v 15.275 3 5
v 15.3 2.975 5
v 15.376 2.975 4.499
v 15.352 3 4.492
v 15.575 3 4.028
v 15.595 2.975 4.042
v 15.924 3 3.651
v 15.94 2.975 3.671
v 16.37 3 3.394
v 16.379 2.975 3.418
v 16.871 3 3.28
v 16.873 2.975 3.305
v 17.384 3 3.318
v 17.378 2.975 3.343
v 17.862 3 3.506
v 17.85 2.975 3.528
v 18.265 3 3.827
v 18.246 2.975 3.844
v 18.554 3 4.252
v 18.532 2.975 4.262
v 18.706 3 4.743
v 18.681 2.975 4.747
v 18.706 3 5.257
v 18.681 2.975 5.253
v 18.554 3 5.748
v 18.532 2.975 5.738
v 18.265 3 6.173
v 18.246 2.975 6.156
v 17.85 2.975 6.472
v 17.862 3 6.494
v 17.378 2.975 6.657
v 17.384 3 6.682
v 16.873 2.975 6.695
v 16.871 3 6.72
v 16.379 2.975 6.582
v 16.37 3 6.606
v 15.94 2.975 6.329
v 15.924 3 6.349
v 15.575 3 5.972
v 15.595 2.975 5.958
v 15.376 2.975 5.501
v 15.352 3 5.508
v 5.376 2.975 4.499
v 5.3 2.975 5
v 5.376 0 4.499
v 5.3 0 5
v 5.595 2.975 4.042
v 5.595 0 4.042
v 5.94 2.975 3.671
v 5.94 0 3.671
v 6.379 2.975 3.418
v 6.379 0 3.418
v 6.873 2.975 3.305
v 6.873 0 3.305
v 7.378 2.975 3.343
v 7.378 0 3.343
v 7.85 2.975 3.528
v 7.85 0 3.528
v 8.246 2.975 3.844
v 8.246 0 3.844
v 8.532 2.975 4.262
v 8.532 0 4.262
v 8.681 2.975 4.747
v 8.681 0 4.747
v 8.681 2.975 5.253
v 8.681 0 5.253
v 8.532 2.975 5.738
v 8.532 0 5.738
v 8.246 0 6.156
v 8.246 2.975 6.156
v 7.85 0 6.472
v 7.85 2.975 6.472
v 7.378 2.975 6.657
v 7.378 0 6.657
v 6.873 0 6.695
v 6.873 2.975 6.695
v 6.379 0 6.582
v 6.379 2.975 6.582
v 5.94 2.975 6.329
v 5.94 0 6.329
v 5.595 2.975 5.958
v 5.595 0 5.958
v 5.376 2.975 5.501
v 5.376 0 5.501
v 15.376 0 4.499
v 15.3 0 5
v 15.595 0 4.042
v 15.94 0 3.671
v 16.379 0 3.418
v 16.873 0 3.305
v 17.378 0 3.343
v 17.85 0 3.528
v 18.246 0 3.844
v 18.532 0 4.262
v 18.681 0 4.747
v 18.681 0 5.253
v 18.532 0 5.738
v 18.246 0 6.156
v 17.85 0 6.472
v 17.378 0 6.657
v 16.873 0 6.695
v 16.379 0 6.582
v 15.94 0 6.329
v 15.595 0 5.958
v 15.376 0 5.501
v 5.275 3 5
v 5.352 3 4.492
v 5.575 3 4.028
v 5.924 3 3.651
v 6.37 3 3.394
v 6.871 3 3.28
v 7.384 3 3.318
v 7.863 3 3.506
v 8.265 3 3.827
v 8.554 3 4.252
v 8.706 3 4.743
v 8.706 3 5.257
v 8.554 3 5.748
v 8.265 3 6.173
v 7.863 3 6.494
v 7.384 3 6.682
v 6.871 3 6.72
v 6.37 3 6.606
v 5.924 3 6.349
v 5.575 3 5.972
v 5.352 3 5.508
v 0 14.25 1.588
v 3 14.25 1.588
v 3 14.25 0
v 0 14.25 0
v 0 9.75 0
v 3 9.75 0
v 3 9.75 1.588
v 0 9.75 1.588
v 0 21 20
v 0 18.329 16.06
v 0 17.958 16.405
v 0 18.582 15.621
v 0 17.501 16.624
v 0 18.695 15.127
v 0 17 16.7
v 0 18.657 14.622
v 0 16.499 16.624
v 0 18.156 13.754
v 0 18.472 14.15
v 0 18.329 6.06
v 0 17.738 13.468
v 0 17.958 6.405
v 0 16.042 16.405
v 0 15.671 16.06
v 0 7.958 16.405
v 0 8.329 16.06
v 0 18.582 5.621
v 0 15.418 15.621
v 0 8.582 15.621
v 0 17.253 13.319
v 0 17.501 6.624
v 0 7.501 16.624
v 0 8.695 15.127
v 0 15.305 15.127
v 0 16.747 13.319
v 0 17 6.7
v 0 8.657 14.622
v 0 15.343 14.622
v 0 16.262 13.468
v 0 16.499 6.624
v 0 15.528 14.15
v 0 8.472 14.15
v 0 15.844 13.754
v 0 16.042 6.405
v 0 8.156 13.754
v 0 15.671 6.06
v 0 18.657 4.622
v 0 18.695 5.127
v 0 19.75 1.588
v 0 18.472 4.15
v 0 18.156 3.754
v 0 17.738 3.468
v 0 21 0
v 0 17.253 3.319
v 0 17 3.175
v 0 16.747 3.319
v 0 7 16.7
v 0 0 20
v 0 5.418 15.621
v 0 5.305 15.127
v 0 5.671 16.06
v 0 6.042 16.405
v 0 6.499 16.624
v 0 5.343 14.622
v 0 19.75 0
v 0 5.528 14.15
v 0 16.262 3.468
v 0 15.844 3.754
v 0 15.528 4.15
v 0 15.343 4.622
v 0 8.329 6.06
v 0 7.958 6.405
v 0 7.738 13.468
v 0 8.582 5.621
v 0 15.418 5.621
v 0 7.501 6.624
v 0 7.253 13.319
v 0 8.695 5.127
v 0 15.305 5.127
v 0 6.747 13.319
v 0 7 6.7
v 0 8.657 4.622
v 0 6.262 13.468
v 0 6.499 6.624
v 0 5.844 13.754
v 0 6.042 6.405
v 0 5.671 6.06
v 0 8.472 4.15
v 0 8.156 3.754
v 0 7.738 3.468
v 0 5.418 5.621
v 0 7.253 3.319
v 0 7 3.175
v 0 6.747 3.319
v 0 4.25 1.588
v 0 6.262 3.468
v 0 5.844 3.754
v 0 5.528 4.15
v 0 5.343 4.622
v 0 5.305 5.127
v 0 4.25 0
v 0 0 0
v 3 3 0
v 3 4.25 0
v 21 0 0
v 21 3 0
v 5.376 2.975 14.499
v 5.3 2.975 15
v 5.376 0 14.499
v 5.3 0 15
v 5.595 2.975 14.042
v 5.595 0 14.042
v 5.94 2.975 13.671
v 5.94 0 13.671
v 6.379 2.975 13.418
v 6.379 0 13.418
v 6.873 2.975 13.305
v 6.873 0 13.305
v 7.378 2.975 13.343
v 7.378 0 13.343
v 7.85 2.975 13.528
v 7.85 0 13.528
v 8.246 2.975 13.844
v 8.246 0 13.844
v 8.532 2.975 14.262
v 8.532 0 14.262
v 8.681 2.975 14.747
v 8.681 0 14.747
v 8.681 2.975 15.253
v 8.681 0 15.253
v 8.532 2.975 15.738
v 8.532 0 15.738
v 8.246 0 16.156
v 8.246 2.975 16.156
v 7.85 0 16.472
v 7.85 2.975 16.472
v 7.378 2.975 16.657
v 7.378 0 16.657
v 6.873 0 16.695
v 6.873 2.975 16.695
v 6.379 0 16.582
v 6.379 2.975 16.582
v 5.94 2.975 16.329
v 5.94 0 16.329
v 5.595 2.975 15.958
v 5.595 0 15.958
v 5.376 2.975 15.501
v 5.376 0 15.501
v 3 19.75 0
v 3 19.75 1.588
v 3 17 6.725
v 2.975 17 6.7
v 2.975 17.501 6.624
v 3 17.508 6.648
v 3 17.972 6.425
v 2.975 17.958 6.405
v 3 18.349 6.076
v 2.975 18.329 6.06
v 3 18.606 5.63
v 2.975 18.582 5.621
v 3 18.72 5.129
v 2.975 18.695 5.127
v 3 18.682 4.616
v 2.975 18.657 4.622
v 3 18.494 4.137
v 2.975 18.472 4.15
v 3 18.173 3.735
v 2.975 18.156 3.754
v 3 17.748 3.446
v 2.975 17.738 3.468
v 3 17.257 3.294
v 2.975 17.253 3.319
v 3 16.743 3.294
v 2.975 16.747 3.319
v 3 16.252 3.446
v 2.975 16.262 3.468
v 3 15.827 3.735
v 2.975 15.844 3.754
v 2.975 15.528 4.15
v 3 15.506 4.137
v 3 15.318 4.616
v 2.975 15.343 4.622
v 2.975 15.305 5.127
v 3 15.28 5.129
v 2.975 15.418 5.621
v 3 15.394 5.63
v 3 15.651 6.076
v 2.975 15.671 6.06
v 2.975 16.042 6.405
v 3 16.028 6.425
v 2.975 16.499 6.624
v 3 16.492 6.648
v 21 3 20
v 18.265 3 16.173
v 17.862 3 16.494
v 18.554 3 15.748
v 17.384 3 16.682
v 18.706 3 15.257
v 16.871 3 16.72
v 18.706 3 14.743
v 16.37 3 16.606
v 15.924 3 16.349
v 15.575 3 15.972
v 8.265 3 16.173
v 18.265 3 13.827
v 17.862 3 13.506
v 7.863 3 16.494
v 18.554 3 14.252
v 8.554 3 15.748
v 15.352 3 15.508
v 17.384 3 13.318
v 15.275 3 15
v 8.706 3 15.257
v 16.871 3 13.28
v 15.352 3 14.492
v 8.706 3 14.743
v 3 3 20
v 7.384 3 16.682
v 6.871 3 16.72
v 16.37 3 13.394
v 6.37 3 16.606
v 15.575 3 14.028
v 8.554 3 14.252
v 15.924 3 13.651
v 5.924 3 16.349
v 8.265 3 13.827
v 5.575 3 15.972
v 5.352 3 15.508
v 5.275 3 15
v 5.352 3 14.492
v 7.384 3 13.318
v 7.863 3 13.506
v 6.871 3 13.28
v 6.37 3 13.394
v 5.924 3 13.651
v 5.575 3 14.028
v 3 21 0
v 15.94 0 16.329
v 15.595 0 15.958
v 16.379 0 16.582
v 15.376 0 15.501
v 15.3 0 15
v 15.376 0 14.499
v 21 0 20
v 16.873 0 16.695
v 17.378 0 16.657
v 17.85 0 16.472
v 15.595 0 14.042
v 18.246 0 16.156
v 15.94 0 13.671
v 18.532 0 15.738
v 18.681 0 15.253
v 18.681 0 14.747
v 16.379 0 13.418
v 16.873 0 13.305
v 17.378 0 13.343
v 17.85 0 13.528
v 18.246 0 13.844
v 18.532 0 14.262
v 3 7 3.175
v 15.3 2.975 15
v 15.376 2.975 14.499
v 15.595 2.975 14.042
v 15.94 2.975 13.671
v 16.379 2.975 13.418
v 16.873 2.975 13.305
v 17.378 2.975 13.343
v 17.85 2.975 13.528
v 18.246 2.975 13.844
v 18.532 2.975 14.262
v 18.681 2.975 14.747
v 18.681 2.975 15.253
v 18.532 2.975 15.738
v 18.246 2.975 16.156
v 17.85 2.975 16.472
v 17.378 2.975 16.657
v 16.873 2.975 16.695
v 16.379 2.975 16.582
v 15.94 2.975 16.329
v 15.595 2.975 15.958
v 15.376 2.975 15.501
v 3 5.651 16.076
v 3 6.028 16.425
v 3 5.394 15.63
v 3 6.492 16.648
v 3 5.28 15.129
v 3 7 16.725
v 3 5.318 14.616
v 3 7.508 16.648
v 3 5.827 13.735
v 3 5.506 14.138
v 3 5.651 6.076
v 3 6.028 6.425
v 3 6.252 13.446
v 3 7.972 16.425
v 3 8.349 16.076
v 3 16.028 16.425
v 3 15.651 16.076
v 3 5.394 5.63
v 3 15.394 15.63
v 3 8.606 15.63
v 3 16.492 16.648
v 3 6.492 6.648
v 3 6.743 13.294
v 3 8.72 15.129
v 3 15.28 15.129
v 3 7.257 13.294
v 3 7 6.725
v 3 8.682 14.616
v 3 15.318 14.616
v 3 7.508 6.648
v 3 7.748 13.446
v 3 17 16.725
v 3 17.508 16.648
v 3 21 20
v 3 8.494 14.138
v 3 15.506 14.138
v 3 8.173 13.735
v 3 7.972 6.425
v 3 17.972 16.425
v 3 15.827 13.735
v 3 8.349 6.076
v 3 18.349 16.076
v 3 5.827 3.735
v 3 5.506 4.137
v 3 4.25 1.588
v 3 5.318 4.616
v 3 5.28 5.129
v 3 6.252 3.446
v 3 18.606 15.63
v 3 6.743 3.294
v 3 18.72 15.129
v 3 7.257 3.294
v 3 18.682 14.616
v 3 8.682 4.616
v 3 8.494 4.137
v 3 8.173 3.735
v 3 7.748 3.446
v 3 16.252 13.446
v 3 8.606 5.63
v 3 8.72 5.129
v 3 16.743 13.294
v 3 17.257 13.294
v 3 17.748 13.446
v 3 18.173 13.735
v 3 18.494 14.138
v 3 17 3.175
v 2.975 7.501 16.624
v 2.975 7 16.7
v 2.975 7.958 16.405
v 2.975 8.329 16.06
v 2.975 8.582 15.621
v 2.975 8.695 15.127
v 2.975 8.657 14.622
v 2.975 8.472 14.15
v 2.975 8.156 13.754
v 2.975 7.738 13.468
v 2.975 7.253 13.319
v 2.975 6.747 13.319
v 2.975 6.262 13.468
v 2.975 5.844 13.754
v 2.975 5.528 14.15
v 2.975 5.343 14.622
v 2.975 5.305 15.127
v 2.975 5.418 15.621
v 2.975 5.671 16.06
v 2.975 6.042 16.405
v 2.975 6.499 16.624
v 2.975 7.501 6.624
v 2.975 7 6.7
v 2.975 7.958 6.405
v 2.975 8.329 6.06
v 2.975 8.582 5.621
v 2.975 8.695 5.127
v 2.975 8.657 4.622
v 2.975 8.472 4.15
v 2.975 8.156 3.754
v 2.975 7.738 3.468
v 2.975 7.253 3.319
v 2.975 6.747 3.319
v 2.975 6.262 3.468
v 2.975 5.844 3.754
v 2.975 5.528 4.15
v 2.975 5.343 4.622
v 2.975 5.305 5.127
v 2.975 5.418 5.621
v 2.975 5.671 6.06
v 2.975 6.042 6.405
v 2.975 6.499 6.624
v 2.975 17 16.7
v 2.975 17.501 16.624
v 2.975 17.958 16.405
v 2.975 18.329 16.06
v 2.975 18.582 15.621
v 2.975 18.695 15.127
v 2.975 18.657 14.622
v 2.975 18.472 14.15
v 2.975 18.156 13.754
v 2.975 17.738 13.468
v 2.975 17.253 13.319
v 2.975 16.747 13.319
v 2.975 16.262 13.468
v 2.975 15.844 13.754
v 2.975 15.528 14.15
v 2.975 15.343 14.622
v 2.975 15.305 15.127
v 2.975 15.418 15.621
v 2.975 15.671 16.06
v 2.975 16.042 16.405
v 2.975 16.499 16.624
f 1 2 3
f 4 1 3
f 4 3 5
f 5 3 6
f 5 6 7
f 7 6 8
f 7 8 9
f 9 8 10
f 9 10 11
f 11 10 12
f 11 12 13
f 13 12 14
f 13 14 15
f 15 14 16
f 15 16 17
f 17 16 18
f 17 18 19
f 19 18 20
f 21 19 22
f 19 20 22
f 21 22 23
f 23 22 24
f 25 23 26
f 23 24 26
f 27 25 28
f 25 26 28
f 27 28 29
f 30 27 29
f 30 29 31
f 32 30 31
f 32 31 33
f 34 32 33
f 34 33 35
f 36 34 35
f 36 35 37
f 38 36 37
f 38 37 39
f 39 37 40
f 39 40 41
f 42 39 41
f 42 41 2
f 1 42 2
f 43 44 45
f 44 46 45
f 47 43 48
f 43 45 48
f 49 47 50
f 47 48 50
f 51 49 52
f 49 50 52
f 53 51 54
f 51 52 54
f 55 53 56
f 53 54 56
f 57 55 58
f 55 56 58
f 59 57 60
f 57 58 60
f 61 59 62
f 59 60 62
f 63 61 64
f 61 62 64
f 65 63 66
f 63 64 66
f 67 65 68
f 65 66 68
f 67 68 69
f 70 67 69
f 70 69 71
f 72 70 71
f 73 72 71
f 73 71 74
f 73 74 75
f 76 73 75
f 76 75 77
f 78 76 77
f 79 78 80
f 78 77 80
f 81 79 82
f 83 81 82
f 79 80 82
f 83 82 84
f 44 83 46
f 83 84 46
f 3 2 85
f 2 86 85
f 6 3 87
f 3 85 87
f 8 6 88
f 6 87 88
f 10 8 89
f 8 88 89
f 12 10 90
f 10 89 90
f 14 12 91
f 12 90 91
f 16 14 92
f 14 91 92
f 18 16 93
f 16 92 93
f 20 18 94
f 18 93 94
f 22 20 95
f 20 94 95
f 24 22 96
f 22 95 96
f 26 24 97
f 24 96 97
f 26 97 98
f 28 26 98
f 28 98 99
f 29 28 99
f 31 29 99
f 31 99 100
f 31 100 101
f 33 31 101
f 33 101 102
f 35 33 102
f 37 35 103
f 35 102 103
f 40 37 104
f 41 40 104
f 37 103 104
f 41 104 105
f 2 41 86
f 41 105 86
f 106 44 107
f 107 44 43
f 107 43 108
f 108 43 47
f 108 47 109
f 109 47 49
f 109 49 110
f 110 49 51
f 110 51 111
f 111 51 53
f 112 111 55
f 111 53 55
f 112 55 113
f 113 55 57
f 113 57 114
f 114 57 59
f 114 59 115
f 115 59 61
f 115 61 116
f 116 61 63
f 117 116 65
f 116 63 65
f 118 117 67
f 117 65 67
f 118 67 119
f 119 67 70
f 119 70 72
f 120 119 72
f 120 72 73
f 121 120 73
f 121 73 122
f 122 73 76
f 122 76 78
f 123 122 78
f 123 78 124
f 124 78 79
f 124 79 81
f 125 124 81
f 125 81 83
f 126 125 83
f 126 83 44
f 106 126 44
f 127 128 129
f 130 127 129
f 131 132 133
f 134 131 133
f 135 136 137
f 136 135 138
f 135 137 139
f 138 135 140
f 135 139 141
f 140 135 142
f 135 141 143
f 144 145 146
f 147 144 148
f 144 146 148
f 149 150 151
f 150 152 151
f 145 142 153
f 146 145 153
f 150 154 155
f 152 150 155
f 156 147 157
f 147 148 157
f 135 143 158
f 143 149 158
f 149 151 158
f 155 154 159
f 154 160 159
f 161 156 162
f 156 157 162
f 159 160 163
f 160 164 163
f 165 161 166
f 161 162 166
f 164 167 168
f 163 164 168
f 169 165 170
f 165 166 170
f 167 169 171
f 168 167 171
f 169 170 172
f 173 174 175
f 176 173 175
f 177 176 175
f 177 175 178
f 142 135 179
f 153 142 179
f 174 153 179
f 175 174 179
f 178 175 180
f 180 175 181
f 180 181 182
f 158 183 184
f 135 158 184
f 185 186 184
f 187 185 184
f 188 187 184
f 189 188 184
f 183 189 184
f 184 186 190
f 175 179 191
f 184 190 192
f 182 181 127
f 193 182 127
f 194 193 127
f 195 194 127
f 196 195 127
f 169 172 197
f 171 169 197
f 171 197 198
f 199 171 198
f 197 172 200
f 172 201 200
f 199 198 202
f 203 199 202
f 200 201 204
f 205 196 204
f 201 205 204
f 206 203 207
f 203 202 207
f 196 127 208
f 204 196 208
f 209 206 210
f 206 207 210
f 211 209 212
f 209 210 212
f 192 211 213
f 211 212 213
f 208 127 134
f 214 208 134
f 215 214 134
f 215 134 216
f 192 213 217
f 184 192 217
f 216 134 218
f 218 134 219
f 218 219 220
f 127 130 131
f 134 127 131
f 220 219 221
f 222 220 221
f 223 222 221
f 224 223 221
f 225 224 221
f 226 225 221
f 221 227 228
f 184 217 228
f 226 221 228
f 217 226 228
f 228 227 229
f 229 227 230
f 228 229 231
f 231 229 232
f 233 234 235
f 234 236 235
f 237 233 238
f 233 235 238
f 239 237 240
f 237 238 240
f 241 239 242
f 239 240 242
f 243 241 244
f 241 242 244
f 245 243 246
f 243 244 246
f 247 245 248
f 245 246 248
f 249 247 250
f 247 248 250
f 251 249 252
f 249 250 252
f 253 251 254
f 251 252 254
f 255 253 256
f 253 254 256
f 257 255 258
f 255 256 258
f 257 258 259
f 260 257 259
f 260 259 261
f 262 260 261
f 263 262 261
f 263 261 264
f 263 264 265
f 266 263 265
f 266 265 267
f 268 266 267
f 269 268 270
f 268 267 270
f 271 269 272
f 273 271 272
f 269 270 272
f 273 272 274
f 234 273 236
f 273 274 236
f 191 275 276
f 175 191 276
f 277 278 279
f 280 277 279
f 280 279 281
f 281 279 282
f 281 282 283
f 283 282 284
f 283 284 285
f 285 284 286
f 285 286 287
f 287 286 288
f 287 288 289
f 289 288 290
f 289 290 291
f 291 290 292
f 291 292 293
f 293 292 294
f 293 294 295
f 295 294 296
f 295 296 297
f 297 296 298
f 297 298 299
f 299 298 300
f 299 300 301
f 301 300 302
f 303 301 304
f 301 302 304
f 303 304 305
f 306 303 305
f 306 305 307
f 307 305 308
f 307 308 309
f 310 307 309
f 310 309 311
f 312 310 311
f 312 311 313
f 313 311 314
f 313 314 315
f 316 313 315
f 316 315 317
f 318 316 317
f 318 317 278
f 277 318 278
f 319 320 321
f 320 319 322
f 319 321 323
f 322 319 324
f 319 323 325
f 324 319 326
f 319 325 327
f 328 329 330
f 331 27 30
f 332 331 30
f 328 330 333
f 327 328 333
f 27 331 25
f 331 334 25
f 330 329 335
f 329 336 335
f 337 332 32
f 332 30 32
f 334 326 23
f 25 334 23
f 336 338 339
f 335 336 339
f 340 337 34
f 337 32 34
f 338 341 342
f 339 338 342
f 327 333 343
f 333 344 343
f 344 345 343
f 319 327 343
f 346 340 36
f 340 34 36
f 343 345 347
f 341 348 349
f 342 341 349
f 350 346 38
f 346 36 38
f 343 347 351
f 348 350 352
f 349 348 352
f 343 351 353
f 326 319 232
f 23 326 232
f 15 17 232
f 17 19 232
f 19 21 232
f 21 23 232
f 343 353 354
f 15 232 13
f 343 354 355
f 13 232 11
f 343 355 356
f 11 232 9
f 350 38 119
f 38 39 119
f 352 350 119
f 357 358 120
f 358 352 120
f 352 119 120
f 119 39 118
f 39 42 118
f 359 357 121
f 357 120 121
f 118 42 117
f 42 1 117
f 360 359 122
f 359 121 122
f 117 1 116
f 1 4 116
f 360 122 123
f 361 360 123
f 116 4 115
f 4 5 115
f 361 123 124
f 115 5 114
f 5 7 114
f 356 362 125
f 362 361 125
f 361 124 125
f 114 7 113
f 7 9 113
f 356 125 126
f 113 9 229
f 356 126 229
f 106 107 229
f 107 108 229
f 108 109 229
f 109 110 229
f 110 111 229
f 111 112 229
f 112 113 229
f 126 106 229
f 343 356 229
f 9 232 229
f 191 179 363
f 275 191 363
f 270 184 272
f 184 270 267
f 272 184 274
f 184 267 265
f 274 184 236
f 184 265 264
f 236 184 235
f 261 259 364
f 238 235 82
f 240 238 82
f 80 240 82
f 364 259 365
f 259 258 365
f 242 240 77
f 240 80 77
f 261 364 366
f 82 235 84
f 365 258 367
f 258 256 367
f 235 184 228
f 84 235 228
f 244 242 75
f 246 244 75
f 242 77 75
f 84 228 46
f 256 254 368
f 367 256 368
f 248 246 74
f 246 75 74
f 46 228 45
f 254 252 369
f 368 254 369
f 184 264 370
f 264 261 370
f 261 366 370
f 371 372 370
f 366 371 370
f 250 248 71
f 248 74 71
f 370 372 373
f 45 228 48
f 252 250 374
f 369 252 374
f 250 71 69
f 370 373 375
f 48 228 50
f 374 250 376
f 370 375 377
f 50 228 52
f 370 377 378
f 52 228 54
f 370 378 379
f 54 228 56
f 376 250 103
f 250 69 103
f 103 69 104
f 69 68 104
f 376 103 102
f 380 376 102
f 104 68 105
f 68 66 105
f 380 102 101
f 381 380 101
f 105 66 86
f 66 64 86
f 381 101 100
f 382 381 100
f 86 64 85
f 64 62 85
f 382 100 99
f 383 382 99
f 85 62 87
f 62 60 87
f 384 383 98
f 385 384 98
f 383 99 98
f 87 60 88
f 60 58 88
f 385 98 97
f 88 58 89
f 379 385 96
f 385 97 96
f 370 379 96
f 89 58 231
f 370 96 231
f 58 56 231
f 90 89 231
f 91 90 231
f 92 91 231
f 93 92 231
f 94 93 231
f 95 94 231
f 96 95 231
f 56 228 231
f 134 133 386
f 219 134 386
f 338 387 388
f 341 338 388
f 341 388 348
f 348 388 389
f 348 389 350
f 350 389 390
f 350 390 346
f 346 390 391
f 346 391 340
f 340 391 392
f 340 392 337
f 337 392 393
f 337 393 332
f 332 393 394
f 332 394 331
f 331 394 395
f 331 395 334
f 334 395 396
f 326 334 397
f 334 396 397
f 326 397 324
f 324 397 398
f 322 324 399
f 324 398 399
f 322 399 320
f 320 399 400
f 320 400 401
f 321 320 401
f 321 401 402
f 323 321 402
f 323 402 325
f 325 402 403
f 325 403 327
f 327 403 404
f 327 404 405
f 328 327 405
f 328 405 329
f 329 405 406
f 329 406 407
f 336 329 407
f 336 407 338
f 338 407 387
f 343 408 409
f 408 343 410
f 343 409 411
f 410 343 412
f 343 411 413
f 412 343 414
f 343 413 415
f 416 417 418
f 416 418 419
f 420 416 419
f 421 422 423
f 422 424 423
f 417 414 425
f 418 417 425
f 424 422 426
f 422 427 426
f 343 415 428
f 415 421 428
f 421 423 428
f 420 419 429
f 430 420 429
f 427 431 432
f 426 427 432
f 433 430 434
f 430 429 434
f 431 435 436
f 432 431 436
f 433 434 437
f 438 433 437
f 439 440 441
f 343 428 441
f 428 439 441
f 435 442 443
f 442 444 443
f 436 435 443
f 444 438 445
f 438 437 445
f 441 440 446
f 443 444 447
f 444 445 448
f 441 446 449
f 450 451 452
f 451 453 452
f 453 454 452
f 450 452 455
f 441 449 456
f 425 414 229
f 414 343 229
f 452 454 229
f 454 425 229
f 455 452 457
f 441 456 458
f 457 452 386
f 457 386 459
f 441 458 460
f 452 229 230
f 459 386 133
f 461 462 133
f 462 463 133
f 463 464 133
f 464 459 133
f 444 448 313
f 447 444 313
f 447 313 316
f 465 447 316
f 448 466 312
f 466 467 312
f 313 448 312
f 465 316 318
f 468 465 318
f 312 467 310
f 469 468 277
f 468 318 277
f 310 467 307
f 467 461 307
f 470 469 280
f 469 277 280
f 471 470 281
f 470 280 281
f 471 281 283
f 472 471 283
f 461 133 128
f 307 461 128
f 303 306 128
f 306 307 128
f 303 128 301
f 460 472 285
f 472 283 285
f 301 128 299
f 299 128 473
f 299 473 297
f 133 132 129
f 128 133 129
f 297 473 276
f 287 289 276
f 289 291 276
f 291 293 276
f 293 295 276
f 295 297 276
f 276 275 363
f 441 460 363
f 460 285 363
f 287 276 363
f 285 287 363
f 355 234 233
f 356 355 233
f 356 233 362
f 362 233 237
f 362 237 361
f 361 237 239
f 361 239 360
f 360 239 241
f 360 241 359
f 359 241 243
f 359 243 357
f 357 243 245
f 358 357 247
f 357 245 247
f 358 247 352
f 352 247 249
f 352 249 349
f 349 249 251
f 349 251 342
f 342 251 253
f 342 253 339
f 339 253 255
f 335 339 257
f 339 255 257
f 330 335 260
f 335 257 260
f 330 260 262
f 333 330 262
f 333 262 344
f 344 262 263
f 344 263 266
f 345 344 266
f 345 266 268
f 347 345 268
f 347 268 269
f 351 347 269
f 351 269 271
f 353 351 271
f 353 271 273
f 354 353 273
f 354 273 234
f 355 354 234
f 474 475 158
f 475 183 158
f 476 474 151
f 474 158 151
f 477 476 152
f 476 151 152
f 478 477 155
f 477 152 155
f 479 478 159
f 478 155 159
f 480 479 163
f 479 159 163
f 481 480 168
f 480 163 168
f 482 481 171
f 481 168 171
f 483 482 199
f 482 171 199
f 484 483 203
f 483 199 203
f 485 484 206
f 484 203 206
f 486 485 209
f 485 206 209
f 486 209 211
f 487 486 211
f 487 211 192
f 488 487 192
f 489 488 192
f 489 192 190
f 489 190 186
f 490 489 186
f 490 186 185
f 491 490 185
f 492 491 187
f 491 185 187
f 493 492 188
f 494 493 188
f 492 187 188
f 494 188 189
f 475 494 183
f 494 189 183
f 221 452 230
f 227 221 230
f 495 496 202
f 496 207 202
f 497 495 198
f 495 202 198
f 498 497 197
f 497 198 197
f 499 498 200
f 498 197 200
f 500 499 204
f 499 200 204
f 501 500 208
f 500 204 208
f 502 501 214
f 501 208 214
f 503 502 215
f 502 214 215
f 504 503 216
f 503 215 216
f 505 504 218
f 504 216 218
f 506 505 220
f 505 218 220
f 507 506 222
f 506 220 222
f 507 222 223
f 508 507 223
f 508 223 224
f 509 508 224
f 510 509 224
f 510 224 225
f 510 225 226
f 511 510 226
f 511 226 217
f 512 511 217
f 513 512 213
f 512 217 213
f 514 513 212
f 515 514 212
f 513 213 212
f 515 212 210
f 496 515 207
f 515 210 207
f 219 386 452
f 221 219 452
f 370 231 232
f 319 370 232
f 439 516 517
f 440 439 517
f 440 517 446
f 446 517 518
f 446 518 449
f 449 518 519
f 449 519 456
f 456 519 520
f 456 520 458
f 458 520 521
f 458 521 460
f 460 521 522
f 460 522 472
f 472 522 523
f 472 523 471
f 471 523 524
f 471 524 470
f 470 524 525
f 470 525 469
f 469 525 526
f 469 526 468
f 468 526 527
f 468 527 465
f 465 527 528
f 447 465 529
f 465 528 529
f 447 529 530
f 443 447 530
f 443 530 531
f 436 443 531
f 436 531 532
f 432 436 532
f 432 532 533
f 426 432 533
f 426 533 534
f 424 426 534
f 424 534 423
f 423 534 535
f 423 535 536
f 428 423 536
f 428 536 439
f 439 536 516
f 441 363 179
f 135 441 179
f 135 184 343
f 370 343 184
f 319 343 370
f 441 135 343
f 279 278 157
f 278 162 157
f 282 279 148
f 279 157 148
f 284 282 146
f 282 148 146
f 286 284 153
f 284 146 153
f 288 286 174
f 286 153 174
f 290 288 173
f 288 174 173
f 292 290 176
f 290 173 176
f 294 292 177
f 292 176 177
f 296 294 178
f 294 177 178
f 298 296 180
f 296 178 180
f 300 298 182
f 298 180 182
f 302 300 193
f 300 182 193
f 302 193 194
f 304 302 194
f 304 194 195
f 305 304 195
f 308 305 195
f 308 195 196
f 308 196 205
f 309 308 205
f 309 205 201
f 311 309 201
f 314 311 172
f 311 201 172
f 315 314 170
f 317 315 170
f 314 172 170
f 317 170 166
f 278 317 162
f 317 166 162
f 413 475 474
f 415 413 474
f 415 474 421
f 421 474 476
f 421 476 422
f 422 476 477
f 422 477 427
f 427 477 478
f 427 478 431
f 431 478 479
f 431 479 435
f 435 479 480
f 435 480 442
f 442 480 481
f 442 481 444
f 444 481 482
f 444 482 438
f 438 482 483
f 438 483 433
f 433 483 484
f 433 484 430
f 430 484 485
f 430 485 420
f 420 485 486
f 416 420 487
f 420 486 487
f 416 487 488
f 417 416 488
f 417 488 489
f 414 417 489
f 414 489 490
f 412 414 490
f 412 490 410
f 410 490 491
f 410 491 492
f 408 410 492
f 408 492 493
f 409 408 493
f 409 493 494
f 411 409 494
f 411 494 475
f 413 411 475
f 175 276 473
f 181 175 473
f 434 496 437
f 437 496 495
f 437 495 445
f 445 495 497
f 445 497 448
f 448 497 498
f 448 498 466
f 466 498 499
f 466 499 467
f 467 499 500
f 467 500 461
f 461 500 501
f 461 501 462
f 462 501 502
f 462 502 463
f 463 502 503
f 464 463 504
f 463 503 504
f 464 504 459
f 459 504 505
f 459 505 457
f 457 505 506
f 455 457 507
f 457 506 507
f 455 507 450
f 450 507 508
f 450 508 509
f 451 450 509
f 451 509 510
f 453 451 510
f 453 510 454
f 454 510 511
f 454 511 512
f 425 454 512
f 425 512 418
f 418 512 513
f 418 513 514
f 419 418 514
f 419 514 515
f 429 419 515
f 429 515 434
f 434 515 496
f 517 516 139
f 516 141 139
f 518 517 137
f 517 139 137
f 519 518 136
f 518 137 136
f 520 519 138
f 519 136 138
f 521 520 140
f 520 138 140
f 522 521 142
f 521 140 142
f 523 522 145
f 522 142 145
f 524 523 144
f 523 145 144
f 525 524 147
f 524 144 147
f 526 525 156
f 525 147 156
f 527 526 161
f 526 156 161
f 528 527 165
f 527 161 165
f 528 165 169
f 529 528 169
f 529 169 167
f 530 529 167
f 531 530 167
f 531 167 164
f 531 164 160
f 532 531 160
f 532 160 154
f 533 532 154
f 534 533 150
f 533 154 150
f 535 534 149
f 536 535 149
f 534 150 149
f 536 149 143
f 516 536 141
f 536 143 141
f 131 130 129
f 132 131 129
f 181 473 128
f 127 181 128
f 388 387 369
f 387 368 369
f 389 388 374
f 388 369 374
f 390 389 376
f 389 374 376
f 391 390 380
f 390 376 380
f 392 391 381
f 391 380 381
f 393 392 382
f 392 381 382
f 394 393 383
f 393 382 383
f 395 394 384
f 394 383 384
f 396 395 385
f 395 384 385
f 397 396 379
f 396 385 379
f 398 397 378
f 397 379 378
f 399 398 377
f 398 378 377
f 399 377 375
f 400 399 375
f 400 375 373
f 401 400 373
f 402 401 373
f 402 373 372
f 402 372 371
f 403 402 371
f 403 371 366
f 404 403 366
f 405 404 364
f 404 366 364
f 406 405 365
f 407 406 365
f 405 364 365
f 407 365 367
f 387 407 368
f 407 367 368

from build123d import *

# Parameters (mm, degrees)
BOSS_EXTRUDE1_DEPTH            = 20
M3_CLEARANCE_HOLE1_D           = 3.4
M3_CLEARANCE_HOLE1_CSINK_D     = 3.45
M3_CLEARANCE_HOLE1_CSINK_ANGLE = 90
M3_CLEARANCE_HOLE2_D           = 3.4
M3_CLEARANCE_HOLE2_CSINK_D     = 3.45
M3_CLEARANCE_HOLE2_CSINK_ANGLE = 90
CUT_EXTRUDE1_DEPTH             = 3


with BuildPart() as part:
    # Sketch1 → Boss-Extrude1 (new body)
    with BuildSketch(Plane.XY):
        Polygon((0, 21), (0, 0), (21, 0), (21, 3), (3, 3), (3, 21), align=None)
    extrude(amount=BOSS_EXTRUDE1_DEPTH)

    # M3 Clearance Hole1 (through all)
    with Locations(Plane(origin=(0, 3, 0), x_dir=(1, 0, 0), z_dir=(0, 1, 0))):
        with Locations((7, -15), (7, -5), (17, -5), (17, -15)):
            CounterSinkHole(M3_CLEARANCE_HOLE1_D / 2, M3_CLEARANCE_HOLE1_CSINK_D / 2, counter_sink_angle=M3_CLEARANCE_HOLE1_CSINK_ANGLE)

    # M3 Clearance Hole2 (through all)
    with Locations(Plane(origin=(3, 0, 0), x_dir=(0, 0, -1), z_dir=(1, 0, 0))):
        with Locations((-15, 7), (-5, 7), (-5, 17), (-15, 17)):
            CounterSinkHole(M3_CLEARANCE_HOLE2_D / 2, M3_CLEARANCE_HOLE2_CSINK_D / 2, counter_sink_angle=M3_CLEARANCE_HOLE2_CSINK_ANGLE)

    # Sketch6 → Cut-Extrude1 (cut)
    with BuildSketch(Plane(origin=(3, 0, 0), x_dir=(0, 0, -1), z_dir=(1, 0, 0))):
        Polygon((0, 9.75), (-1.58771324, 9.75), (-3.175426481, 7), (-1.58771324, 4.25), (0, 4.25), align=None)
        Polygon((-1.58771324, 14.25), (0, 14.25), (0, 19.75), (-1.58771324, 19.75), (-3.175426481, 17), align=None)
    extrude(amount=-CUT_EXTRUDE1_DEPTH, mode=Mode.SUBTRACT)


solid = part.part
